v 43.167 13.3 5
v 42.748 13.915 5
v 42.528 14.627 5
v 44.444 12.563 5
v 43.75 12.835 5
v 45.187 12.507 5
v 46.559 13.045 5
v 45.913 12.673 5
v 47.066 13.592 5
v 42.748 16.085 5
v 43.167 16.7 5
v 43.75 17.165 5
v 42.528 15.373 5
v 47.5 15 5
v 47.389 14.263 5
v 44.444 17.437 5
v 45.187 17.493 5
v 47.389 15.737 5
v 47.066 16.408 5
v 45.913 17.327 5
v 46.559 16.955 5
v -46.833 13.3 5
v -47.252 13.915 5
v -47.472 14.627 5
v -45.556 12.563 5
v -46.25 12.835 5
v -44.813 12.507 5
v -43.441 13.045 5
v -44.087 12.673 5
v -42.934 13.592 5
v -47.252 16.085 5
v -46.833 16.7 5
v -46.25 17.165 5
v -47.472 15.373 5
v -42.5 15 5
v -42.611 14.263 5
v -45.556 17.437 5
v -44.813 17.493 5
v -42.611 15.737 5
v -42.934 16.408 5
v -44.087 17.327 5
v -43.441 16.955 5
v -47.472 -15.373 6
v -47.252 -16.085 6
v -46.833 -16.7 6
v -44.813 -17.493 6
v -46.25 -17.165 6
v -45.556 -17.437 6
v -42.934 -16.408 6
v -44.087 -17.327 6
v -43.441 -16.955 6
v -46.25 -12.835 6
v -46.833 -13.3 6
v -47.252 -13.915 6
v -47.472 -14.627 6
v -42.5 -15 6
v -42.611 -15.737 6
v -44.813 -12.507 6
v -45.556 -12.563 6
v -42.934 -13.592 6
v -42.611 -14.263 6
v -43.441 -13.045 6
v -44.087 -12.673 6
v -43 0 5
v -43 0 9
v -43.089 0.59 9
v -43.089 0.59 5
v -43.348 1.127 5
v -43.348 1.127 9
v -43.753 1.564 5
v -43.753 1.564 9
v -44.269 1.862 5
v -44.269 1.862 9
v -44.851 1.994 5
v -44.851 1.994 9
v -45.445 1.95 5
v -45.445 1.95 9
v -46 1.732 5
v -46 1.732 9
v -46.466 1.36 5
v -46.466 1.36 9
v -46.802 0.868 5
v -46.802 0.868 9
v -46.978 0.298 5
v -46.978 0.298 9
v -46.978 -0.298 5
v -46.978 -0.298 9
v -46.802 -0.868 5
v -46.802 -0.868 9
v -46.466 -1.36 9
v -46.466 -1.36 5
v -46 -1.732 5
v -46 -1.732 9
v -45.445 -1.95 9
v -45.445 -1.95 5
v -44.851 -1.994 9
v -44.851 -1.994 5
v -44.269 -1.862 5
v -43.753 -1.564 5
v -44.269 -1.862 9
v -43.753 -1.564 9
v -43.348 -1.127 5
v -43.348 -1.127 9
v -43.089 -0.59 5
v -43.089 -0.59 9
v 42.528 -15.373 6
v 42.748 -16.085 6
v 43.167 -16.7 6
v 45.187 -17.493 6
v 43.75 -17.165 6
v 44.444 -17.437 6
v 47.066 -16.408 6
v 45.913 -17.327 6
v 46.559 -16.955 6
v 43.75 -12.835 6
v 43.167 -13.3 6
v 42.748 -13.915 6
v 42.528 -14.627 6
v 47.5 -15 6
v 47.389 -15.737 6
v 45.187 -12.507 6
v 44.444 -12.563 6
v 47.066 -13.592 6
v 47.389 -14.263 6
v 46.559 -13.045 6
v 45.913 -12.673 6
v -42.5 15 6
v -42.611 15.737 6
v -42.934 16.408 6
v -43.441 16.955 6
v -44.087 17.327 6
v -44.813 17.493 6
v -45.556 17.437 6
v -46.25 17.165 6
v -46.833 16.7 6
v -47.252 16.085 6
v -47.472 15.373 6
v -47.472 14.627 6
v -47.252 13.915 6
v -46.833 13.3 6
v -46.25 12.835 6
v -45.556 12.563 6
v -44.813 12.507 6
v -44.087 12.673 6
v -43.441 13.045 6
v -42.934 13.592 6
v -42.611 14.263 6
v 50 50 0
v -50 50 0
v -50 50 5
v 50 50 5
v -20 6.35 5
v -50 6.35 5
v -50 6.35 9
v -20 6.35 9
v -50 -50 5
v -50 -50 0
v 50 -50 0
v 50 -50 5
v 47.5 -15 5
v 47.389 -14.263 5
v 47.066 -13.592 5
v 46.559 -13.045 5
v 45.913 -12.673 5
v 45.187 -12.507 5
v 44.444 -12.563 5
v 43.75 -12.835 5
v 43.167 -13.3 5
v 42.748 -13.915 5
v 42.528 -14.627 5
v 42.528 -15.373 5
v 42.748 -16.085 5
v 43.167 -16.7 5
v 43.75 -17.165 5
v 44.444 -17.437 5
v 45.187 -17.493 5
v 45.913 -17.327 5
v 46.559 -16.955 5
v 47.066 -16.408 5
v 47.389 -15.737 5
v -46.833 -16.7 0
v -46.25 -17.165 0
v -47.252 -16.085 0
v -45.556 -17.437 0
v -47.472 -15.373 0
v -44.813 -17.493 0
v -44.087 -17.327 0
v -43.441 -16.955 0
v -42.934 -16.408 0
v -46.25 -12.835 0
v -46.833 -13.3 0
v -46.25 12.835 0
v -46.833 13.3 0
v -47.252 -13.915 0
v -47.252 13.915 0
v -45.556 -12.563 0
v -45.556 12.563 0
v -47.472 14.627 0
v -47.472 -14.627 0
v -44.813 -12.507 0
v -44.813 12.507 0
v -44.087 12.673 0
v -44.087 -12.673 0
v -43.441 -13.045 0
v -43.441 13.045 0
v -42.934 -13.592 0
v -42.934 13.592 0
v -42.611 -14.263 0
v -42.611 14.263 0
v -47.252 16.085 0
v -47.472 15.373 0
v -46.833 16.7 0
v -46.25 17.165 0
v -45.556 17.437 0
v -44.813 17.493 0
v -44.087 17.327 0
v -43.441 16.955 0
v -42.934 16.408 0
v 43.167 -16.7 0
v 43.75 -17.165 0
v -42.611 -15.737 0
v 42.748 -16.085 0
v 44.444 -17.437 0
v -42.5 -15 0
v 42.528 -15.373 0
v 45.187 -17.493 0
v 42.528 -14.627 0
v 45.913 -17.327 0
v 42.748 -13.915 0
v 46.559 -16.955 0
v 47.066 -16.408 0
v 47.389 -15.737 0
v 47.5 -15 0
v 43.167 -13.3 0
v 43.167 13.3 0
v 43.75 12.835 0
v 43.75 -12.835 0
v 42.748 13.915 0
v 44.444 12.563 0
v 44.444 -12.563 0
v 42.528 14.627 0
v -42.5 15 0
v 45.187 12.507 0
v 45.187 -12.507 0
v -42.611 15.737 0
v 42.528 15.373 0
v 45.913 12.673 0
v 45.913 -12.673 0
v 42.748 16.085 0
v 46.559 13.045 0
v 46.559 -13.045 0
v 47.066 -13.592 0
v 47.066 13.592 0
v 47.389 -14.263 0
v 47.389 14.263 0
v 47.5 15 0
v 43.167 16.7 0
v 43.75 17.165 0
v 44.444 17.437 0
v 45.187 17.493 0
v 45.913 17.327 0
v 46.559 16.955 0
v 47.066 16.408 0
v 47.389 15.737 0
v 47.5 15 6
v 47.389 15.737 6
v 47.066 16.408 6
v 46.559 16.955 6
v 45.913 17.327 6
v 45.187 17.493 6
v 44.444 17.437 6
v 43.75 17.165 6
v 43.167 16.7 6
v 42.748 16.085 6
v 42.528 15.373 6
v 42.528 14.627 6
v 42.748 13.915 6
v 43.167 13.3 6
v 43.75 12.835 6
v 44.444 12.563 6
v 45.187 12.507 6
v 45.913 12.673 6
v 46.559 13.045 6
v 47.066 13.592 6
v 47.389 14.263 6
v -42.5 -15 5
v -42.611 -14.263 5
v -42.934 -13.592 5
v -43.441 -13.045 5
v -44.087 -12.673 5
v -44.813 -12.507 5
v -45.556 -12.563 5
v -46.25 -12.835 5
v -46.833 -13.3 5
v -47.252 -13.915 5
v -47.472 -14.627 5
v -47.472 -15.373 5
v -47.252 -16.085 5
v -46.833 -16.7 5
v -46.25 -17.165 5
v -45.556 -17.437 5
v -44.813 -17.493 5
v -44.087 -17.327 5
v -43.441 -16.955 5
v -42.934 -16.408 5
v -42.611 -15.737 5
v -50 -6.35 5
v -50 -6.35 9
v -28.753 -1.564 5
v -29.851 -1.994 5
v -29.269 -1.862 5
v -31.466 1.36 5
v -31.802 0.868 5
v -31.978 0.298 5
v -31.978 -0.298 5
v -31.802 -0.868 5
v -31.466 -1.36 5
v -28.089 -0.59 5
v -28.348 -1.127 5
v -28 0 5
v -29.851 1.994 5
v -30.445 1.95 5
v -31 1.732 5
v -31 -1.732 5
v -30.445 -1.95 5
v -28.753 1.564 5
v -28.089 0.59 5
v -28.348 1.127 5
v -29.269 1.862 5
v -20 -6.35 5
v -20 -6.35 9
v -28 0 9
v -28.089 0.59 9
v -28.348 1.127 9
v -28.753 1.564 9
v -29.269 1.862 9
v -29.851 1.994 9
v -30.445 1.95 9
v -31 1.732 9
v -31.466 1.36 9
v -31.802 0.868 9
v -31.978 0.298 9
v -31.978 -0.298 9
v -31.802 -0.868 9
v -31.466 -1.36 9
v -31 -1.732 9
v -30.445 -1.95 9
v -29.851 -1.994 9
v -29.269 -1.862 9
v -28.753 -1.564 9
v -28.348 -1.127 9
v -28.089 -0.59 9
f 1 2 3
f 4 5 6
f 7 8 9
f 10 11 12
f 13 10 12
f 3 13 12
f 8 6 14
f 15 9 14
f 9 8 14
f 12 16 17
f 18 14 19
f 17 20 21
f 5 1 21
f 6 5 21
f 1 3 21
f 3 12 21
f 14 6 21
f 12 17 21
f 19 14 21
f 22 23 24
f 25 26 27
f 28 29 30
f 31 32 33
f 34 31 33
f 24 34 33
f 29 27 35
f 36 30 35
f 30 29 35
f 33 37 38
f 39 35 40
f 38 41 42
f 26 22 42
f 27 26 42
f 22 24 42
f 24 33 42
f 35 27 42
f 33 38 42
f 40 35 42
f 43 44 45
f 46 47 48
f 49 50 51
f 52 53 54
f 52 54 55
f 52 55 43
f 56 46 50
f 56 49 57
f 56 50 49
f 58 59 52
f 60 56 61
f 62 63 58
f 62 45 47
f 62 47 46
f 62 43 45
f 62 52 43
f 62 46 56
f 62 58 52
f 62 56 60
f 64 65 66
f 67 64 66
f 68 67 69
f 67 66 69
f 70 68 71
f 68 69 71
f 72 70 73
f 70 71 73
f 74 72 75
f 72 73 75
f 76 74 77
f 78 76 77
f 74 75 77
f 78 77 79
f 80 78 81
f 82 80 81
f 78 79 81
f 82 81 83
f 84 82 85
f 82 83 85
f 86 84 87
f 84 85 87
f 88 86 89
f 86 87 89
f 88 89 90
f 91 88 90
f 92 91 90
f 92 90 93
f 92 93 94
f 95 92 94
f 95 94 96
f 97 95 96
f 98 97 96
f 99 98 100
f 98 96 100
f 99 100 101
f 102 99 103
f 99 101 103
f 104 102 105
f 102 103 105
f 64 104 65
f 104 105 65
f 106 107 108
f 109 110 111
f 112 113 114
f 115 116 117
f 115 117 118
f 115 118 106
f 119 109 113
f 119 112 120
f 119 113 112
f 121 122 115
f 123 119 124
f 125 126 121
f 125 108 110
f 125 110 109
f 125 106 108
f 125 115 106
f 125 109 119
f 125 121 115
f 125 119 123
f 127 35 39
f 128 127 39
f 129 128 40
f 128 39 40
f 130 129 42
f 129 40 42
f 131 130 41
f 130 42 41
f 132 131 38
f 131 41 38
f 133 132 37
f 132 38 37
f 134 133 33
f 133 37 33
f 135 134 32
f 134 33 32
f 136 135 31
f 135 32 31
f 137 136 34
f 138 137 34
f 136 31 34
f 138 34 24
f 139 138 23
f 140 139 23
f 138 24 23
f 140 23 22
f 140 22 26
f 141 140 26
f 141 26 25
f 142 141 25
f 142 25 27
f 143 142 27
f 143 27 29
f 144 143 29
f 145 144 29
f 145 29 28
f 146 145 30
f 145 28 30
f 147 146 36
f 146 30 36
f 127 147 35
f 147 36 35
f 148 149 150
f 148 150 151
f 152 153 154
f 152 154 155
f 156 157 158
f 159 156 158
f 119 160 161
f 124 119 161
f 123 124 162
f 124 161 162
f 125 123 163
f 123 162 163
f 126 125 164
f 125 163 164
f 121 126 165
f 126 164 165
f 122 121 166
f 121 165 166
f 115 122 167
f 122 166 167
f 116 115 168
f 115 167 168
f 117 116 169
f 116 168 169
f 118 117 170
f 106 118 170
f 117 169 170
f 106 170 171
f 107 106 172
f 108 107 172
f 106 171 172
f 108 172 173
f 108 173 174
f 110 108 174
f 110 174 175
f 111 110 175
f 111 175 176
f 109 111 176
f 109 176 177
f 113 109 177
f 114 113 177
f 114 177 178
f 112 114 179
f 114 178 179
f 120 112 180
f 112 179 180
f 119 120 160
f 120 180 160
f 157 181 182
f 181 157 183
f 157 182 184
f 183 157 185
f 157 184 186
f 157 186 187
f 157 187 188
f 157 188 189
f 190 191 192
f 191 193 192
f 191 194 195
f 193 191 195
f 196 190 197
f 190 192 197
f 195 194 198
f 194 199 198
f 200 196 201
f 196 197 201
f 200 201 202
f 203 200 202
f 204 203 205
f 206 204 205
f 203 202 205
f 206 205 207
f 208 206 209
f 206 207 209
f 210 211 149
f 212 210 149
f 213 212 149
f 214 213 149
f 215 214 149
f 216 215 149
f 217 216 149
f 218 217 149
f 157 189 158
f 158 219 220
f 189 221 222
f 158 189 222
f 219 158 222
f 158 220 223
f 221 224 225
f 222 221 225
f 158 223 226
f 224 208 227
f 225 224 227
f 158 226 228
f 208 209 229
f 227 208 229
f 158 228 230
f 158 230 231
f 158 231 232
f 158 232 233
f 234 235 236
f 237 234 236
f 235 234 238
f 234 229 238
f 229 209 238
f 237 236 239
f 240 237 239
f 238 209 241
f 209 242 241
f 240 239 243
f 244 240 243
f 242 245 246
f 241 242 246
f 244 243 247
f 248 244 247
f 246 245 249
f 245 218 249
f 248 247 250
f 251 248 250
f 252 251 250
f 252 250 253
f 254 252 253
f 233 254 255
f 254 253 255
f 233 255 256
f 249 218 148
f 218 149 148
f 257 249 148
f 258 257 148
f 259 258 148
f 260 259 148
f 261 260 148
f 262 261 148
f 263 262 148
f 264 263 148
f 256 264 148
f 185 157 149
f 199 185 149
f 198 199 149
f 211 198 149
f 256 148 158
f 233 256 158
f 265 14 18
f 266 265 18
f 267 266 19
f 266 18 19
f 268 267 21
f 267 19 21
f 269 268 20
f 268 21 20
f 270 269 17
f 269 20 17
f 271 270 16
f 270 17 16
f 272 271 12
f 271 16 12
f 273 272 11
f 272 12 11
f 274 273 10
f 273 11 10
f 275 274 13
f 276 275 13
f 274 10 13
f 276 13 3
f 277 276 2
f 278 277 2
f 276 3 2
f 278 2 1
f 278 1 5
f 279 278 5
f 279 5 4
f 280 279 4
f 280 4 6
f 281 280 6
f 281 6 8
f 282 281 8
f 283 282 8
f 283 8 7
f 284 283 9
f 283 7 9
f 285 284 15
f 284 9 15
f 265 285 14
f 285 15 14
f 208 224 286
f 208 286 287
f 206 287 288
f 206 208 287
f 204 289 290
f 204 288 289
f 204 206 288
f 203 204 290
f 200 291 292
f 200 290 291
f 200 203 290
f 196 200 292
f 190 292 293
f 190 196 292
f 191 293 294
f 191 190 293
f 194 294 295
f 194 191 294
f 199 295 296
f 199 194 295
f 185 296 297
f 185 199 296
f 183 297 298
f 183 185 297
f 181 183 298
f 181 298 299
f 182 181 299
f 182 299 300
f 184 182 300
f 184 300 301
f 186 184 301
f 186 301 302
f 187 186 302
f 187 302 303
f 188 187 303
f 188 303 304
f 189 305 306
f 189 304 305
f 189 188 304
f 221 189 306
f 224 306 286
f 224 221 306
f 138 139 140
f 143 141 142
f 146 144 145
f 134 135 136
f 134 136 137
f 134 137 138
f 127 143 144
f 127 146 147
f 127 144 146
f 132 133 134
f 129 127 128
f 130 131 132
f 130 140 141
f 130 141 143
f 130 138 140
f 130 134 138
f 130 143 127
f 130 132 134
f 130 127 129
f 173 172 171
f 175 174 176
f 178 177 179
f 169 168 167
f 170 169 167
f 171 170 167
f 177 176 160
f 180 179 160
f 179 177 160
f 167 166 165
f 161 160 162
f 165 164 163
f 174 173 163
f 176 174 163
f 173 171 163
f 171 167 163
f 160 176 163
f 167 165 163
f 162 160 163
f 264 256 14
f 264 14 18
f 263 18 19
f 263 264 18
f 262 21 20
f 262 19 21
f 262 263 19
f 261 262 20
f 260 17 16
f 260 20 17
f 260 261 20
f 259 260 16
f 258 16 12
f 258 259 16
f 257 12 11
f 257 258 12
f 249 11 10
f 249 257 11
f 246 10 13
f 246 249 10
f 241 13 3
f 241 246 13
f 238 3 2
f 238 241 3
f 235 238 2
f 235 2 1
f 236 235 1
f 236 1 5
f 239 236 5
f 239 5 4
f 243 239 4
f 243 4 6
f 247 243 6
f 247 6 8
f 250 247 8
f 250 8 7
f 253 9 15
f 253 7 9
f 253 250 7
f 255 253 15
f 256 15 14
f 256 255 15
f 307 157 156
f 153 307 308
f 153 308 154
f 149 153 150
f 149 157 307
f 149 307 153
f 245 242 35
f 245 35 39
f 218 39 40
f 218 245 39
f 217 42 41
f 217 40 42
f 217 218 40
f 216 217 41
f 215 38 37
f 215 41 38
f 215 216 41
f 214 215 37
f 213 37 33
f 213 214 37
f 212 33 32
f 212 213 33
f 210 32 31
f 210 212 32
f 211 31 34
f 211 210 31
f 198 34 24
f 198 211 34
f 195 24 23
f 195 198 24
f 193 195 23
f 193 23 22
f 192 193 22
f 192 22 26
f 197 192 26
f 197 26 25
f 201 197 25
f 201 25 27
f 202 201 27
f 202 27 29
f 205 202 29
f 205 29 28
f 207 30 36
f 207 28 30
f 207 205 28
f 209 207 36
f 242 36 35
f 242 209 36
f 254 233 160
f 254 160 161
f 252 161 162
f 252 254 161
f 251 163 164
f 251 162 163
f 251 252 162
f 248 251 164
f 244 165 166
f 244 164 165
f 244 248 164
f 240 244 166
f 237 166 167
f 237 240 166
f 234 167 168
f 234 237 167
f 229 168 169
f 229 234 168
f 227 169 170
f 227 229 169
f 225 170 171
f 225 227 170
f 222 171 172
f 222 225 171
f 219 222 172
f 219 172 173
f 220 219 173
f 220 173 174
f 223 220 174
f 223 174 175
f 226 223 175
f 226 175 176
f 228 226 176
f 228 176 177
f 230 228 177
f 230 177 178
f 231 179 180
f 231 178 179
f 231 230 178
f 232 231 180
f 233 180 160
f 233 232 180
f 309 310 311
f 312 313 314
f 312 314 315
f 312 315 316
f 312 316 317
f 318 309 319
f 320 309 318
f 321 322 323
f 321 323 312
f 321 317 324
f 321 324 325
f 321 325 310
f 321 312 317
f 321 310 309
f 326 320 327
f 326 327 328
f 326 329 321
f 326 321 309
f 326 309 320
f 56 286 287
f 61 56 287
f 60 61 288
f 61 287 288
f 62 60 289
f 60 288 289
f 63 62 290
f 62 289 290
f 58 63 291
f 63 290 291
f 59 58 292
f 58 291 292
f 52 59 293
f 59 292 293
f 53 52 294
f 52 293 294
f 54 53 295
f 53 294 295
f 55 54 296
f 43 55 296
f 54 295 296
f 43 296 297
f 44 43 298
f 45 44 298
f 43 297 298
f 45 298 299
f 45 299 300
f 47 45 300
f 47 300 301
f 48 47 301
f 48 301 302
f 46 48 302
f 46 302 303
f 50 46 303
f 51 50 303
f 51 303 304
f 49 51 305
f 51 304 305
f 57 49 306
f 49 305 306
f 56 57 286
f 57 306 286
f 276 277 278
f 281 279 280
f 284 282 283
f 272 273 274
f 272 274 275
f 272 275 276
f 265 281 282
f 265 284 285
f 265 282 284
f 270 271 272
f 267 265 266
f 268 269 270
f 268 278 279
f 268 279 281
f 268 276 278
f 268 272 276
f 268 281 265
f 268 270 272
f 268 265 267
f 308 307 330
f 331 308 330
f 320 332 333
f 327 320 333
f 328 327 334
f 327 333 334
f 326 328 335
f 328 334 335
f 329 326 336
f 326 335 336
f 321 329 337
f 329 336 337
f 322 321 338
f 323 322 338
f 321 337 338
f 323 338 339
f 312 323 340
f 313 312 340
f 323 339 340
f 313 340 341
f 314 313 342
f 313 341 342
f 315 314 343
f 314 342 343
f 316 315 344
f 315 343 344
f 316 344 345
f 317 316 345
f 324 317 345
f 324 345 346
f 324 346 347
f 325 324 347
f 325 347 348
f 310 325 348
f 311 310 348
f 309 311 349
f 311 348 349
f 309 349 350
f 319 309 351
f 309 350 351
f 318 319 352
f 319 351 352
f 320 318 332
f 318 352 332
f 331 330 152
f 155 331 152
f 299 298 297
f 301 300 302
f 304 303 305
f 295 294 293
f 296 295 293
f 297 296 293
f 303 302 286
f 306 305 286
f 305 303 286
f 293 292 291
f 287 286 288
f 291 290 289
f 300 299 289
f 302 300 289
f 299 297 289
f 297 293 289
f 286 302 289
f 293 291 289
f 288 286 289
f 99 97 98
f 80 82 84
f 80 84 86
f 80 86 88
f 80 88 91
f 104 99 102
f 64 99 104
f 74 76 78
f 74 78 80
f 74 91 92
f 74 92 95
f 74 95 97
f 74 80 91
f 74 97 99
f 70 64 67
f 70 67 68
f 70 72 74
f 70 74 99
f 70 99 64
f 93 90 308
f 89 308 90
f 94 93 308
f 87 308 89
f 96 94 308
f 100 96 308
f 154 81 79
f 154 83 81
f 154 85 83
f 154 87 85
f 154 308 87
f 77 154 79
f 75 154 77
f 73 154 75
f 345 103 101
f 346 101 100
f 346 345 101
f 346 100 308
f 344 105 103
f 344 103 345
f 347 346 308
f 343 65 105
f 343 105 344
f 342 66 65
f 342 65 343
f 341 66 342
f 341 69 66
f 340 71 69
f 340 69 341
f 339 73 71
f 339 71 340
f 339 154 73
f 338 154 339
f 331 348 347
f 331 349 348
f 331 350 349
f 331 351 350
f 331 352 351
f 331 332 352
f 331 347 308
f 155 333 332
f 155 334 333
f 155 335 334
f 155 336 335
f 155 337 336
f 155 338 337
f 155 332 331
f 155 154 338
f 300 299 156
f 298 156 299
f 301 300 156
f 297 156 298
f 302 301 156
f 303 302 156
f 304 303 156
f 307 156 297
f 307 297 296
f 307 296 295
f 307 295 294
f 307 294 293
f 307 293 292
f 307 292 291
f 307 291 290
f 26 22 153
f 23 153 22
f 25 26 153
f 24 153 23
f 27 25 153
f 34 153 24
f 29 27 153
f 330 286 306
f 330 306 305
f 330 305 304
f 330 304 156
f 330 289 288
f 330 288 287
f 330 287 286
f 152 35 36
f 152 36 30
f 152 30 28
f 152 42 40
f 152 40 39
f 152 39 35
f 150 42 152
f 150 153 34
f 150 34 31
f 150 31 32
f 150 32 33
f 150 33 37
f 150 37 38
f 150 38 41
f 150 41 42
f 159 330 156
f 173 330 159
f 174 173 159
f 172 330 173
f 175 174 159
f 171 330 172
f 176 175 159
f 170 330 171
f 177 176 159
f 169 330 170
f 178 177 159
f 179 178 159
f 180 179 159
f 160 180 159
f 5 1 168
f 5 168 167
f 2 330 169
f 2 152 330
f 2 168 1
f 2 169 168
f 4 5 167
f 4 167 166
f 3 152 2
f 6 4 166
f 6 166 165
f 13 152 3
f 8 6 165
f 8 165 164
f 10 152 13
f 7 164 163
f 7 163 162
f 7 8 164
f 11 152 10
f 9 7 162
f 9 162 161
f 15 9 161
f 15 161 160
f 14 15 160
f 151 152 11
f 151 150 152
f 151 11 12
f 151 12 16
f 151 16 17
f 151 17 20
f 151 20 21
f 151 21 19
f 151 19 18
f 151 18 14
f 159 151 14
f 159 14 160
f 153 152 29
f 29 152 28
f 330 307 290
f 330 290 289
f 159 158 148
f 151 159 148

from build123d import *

# Parameters (mm, degrees)
IZIM1_W                       = 100
IZIM1_H                       = 100
Y_KSEKLIK_EKSTR_ZYON1_DEPTH   = 5
IZIM2_W                       = 30
IZIM2_H                       = 12.7
Y_KSEKLIK_EKSTR_ZYON2_DEPTH   = 4
KES_EKSTR_ZYON2_DEPTH         = 71.887234394
KES_EKSTR_ZYON2_DEPTH_BACK    = 35
IZIM3_R                       = 2.5
IZIM4_R                       = 2.5
Y_KSEKLIK_EKSTR_ZYON3_DEPTH   = 1
Y_KSEKLIK_EKSTR_ZYON3_2_DEPTH = 1
Y_KSEKLIK_EKSTR_ZYON3_3_DEPTH = 1
Y_KSEKLIK_EKSTR_ZYON3_4_DEPTH = 1
IZIM5_R                       = 2
KES_EKSTR_ZYON3_DEPTH         = 4


with BuildPart() as part:
    # Çizim1 → Yükseklik-Ekstrüzyon1 (new body)
    with BuildSketch(Plane.XY):
        Rectangle(IZIM1_W, IZIM1_H)
    extrude(amount=Y_KSEKLIK_EKSTR_ZYON1_DEPTH)

    # Çizim2 → Yükseklik-Ekstrüzyon2 (add)
    with BuildSketch(Plane.XY.offset(5)):
        with Locations((-35, 0)):
            Rectangle(IZIM2_W, IZIM2_H)
    extrude(amount=Y_KSEKLIK_EKSTR_ZYON2_DEPTH)

    # Çizim3 → Kes-Ekstrüzyon2 (cut, two sides: drawn at the far end of the back side and taken through both)
    with BuildSketch(Plane.XY.offset(5).offset(-KES_EKSTR_ZYON2_DEPTH_BACK)):
        with Locations((-45, 15)):
            Circle(IZIM3_R)
        with Locations((-45, -15)):
            Circle(IZIM3_R)
        with Locations((45, 15)):
            Circle(IZIM3_R)
        with Locations((45, -15)):
            Circle(IZIM3_R)
    extrude(amount=KES_EKSTR_ZYON2_DEPTH + KES_EKSTR_ZYON2_DEPTH_BACK, mode=Mode.SUBTRACT)

    # Çizim5 → Kes-Ekstrüzyon3 (cut)
    with BuildSketch(Plane.XY.offset(9)):
        with Locations((-45, 0)):
            Circle(IZIM5_R)
        with Locations((-30, 0)):
            Circle(IZIM5_R)
    extrude(amount=-KES_EKSTR_ZYON3_DEPTH, mode=Mode.SUBTRACT)


with BuildPart() as body_2:
    # Çizim4 → Yükseklik-Ekstrüzyon3 (new body)
    with BuildSketch(Plane.XY.offset(5)):
        with Locations((-45, 15)):
            Circle(IZIM4_R)
    extrude(amount=Y_KSEKLIK_EKSTR_ZYON3_DEPTH)


with BuildPart() as body_3:
    # Çizim4 → Y_kseklik-Ekstr_zyon3 2 (new body)
    with BuildSketch(Plane.XY.offset(5)):
        with Locations((45, 15)):
            Circle(IZIM4_R)
    extrude(amount=Y_KSEKLIK_EKSTR_ZYON3_2_DEPTH)


with BuildPart() as body_4:
    # Çizim4 → Y_kseklik-Ekstr_zyon3 3 (new body)
    with BuildSketch(Plane.XY.offset(5)):
        with Locations((-45, -15)):
            Circle(IZIM4_R)
    extrude(amount=Y_KSEKLIK_EKSTR_ZYON3_3_DEPTH)


with BuildPart() as body_5:
    # Çizim4 → Y_kseklik-Ekstr_zyon3 4 (new body)
    with BuildSketch(Plane.XY.offset(5)):
        with Locations((45, -15)):
            Circle(IZIM4_R)
    extrude(amount=Y_KSEKLIK_EKSTR_ZYON3_4_DEPTH)


solid = Compound([part.part, body_2.part, body_3.part, body_4.part, body_5.part])
